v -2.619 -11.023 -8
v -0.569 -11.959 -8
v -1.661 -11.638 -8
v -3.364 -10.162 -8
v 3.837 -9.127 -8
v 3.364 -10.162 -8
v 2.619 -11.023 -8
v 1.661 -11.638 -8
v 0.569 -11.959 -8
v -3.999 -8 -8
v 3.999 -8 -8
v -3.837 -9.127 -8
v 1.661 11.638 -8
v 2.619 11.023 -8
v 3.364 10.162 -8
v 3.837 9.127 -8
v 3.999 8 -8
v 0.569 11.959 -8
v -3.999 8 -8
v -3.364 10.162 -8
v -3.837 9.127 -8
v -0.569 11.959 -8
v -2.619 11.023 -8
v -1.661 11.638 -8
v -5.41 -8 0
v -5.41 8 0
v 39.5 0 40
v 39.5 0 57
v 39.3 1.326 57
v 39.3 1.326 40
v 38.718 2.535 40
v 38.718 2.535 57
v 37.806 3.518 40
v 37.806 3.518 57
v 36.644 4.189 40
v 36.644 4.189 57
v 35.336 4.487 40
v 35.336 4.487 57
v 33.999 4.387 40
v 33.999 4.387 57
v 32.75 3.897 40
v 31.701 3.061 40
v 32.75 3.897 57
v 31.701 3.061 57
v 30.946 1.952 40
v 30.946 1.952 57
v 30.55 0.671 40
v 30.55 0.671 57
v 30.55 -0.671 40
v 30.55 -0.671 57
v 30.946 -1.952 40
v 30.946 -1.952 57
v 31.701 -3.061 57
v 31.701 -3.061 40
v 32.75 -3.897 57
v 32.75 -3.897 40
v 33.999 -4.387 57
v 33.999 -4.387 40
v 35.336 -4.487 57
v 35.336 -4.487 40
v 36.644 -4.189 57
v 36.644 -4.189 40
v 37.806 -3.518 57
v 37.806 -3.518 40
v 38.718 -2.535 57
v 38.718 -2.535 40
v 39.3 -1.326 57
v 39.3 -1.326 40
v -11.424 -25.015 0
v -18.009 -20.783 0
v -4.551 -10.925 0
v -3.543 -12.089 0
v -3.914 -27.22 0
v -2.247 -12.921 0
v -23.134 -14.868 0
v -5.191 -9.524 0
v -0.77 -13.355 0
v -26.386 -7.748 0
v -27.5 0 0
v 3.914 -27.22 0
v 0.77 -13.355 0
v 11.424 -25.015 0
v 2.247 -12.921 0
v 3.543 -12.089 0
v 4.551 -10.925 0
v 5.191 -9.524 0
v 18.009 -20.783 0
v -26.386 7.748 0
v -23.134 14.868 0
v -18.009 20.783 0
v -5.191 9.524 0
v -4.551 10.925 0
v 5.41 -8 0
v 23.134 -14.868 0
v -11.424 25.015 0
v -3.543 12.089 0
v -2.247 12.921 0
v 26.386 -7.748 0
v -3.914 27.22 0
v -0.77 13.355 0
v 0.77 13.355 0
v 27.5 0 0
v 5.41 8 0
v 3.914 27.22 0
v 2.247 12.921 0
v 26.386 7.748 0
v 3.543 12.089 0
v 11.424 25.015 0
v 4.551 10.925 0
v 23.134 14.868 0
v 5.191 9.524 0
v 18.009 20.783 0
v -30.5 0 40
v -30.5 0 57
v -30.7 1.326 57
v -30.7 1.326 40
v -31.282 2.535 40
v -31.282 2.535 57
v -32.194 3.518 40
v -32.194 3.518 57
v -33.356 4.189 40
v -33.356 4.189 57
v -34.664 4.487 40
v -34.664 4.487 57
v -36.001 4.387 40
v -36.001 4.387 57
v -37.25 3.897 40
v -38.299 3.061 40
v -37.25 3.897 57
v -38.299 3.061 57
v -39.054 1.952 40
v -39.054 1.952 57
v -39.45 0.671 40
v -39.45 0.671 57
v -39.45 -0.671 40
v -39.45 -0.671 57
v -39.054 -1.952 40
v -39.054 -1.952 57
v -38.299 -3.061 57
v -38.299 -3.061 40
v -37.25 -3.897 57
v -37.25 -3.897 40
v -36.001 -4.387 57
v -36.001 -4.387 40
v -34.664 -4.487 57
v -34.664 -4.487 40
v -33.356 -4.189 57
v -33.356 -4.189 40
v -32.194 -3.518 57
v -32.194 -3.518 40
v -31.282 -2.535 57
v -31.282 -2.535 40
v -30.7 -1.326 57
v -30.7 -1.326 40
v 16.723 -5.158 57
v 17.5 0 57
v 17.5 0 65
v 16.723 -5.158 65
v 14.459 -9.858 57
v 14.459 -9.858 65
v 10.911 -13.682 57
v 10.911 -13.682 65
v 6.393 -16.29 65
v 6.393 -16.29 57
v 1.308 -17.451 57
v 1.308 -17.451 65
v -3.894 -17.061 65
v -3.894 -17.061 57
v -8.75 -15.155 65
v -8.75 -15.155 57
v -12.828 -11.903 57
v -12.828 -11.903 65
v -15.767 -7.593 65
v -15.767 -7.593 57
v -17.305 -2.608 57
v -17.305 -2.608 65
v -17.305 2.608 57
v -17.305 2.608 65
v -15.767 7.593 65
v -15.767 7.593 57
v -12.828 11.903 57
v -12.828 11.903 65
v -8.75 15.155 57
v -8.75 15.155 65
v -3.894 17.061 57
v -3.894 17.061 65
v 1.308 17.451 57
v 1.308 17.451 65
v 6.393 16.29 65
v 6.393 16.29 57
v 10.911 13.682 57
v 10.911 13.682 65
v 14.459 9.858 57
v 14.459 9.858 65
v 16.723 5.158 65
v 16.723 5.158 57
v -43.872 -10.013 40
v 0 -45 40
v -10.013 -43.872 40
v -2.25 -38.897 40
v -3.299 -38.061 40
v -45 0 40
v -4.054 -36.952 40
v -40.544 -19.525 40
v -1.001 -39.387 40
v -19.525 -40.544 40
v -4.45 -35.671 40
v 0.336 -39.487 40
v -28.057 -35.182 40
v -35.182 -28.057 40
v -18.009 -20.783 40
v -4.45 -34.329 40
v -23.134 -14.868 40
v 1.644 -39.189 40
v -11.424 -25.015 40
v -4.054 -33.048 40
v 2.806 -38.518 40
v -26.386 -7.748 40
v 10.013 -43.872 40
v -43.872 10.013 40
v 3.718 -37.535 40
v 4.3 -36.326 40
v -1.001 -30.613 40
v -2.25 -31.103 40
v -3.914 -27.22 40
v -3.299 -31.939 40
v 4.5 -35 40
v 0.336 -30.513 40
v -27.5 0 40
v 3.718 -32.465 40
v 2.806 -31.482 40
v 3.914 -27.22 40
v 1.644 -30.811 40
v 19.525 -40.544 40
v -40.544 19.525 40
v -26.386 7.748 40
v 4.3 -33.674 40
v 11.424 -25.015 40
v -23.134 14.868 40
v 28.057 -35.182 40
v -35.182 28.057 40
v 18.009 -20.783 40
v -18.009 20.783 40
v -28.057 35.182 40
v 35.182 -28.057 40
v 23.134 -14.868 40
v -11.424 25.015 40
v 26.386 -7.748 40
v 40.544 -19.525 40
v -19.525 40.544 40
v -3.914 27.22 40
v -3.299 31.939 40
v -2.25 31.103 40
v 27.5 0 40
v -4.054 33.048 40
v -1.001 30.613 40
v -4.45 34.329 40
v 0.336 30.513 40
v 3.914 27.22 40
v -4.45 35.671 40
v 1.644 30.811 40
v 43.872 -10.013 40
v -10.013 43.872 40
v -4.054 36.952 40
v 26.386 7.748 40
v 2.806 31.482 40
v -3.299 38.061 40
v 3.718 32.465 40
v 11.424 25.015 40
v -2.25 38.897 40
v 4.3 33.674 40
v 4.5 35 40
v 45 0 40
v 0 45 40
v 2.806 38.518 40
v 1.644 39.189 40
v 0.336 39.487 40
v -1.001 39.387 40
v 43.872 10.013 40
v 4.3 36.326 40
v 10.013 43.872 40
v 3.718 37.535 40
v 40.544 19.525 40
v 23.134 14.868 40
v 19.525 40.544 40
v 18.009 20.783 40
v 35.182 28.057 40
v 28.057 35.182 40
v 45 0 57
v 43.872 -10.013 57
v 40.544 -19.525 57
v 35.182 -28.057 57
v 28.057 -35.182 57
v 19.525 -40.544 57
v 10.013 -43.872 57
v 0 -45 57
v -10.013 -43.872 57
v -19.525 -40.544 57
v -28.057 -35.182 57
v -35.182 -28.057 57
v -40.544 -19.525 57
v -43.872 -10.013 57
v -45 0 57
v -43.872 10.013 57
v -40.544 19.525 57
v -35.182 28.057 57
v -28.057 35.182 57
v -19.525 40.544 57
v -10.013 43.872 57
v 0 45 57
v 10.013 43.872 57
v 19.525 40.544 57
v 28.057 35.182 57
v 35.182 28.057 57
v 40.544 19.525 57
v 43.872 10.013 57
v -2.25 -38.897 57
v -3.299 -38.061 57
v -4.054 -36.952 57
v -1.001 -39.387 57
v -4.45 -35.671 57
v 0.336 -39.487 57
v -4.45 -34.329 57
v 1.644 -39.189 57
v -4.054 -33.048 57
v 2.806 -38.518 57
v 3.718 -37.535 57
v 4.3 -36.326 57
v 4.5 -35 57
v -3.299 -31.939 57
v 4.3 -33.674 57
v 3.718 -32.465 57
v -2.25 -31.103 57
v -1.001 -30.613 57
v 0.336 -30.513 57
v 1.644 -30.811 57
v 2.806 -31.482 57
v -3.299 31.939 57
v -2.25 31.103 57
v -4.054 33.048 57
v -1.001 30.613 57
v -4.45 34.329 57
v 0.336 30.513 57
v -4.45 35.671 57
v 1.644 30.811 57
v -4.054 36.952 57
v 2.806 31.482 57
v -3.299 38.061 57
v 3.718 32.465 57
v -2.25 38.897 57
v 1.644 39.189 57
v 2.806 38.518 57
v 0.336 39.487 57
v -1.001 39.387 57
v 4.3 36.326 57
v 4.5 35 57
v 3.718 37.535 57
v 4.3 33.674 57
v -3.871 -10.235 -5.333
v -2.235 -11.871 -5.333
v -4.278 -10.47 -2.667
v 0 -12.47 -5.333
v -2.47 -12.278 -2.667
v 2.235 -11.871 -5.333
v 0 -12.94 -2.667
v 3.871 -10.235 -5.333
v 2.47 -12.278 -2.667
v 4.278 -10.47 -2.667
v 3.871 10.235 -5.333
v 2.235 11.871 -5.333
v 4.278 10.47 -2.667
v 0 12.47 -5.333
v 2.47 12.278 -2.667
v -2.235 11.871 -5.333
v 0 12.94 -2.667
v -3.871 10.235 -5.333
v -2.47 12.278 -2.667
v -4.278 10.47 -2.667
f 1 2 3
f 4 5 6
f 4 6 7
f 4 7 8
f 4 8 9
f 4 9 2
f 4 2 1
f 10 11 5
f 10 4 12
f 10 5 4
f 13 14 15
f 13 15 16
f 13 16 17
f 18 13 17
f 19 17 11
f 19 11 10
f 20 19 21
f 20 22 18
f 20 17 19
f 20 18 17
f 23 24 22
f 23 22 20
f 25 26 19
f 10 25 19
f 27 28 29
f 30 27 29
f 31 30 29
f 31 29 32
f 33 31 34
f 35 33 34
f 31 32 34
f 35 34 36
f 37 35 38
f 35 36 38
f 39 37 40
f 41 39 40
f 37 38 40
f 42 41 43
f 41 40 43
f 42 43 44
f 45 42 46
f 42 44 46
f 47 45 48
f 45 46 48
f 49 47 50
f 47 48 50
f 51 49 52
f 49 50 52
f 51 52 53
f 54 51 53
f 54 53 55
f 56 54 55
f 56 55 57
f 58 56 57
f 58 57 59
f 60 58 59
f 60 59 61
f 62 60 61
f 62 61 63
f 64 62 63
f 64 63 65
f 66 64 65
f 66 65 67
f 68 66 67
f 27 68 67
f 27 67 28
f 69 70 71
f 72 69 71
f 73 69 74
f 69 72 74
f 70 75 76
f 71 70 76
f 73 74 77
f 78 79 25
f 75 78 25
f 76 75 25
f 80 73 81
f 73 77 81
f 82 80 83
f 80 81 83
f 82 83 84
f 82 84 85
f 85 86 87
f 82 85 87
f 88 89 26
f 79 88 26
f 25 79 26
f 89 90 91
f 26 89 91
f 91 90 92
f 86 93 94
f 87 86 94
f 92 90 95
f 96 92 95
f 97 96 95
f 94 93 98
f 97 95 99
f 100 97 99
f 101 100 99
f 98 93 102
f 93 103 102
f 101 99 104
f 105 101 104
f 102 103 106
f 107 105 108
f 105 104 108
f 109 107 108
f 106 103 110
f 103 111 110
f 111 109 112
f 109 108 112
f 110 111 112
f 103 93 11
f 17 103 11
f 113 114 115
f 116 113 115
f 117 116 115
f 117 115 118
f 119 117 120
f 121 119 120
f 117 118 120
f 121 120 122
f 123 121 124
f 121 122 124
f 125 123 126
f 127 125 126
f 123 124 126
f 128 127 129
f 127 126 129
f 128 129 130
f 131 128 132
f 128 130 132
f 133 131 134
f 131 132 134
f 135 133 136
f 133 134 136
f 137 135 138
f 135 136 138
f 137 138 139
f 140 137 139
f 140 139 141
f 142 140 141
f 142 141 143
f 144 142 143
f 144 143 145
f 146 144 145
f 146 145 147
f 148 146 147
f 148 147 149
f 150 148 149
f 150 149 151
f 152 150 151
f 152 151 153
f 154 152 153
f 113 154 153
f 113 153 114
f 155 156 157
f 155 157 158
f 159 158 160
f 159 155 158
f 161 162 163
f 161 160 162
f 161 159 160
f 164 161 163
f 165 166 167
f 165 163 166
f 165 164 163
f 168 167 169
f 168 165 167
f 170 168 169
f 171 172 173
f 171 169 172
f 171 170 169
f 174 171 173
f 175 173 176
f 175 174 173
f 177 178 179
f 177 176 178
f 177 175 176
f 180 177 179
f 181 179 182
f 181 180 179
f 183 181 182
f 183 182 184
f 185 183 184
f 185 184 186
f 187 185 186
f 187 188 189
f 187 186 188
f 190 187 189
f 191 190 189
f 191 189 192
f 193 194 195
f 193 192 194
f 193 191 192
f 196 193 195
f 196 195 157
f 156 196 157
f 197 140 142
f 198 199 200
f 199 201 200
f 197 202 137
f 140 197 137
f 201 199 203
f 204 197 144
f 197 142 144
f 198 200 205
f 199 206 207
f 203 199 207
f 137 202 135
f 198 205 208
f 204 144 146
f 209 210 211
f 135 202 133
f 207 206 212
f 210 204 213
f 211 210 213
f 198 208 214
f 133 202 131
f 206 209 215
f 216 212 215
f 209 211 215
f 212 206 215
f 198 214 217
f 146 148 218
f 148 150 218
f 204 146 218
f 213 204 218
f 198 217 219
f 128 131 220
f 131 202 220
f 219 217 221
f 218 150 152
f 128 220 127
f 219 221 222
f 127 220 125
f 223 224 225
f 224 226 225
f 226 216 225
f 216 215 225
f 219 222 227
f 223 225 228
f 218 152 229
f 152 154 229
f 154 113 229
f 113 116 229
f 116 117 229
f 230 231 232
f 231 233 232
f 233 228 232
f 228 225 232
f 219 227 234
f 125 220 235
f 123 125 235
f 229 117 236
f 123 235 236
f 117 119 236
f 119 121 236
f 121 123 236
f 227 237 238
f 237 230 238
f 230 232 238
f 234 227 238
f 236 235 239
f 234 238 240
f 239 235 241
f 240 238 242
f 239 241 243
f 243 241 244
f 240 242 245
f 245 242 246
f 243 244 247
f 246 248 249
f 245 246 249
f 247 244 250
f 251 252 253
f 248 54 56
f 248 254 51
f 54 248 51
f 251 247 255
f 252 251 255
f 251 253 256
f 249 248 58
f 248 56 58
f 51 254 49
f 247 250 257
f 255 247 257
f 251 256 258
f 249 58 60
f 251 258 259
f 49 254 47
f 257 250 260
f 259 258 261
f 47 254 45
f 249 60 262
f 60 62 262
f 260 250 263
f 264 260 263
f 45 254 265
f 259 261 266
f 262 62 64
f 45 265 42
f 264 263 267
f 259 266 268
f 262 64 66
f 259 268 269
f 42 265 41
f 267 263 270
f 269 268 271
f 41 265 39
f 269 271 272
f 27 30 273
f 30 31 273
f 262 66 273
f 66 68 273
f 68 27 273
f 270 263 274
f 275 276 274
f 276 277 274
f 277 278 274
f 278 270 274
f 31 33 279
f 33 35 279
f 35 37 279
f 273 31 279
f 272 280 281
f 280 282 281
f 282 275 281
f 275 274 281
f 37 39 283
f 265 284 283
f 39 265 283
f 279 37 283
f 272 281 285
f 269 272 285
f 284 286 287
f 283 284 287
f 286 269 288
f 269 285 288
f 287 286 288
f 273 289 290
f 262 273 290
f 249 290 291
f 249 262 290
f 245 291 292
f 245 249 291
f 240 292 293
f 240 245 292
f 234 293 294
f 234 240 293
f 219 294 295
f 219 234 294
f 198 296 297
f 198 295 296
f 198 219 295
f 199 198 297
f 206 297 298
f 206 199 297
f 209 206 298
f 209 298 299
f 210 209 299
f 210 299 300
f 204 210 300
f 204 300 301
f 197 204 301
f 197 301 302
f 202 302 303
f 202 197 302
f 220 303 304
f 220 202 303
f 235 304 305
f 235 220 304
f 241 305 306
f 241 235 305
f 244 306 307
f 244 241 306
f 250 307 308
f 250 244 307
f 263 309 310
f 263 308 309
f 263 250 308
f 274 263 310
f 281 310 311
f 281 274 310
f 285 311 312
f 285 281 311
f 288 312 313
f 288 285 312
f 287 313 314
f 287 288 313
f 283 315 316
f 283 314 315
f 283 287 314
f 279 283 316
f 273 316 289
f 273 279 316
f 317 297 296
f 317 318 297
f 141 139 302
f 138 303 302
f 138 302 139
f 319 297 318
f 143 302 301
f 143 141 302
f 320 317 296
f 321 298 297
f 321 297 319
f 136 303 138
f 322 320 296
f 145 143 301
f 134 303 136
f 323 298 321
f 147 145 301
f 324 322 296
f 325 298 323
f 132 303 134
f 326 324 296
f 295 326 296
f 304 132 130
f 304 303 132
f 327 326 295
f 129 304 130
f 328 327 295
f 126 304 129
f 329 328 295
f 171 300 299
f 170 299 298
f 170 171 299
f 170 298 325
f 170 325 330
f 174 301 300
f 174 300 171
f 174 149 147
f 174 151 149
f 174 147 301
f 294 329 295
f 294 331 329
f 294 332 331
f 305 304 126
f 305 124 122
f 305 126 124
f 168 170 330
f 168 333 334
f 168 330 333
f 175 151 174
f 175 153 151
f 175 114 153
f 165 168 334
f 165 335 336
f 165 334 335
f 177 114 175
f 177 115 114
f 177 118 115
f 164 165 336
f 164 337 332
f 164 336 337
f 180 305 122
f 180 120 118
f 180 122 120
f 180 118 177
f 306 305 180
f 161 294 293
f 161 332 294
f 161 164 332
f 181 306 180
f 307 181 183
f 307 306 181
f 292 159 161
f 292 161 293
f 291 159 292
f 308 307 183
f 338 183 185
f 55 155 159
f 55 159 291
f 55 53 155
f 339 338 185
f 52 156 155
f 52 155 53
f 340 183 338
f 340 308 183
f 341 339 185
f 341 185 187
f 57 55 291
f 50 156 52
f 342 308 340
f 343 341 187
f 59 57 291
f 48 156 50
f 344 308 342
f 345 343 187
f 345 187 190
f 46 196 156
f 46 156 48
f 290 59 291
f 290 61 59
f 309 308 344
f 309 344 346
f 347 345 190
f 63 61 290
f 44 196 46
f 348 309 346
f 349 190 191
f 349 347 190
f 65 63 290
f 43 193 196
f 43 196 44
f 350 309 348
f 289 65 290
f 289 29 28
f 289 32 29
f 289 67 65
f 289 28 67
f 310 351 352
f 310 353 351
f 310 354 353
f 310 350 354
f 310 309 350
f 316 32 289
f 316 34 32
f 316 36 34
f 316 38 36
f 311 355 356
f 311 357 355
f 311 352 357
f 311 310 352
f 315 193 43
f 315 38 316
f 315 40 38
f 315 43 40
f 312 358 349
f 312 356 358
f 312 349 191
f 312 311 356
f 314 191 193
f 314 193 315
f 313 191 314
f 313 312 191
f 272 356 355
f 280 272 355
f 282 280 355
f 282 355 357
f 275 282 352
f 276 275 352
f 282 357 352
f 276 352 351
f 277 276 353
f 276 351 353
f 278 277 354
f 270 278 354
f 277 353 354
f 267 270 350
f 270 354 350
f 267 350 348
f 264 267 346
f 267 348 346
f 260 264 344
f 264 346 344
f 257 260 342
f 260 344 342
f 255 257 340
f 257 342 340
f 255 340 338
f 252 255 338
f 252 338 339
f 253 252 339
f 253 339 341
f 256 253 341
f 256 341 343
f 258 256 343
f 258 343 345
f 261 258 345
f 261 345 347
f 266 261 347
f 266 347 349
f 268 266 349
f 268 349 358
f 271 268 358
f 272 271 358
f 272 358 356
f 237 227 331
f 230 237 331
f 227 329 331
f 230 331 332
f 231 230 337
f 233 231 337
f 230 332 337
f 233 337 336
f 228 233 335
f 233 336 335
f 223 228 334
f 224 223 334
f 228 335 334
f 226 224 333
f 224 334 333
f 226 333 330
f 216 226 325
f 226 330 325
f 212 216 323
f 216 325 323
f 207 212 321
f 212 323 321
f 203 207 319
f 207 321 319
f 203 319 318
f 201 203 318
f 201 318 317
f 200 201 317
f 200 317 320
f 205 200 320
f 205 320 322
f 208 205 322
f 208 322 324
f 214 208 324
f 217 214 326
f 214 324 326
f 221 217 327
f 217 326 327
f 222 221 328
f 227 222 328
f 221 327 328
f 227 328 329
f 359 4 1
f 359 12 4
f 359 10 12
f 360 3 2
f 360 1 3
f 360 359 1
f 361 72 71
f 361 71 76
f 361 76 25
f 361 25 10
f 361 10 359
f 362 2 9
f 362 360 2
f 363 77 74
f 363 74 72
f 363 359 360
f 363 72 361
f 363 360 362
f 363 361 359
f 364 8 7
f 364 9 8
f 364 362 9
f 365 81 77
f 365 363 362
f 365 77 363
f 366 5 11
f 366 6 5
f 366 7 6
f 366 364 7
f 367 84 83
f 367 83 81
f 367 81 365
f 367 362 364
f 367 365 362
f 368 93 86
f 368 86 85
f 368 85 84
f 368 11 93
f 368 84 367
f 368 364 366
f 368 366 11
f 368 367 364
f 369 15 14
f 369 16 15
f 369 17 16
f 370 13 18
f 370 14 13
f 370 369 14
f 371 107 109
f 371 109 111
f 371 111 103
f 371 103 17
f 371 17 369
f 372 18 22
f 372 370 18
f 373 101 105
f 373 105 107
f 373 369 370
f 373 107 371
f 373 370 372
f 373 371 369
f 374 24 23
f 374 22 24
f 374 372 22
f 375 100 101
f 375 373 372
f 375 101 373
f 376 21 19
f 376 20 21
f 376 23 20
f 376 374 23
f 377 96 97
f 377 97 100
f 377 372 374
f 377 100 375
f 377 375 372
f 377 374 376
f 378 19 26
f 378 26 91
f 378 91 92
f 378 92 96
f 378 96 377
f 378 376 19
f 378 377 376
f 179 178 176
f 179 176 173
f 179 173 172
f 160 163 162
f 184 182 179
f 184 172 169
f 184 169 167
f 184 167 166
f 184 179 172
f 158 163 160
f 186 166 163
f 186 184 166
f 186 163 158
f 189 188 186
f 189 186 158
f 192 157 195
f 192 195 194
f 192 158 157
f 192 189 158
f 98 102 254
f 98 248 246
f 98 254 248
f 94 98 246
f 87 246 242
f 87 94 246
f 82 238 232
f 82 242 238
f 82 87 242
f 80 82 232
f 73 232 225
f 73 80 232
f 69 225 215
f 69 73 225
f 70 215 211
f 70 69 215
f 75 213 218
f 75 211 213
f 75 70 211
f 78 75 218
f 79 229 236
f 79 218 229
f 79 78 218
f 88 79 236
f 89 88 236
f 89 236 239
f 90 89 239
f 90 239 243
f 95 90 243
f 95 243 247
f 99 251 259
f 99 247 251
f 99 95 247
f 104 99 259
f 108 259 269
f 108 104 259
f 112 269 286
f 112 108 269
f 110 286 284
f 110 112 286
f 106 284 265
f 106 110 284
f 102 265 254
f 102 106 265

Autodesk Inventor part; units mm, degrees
ref_plane "YZ Plane" through (0, 0, 0) normal (1, 0, 0) x (0, 1, 0)
ref_plane "XZ Plane" through (0, 0, 0) normal (0, 1, 0) x (-1, 0, 0)
ref_plane "XY Plane" through (0, 0, 0) normal (0, 0, 1) x (1, 0, 0)
sketch "Esboço1" plane through (0, 0, 0) normal (0, 0, 1) x (1, 0, 0)
  circle A0 centre (0, 0) radius 27.5
  dimension "d0" = 55
extrude "Extrusão1" add sketch "Esboço1" along normal blind 40
sketch "Esboço2" plane through (0, 0, 40) normal (0, 0, 1) x (1, 0, 0)
  circle A0 centre (0, 0) radius 45
  dimension "d3" = 90
extrude "Extrusão2" add sketch "Esboço2" along normal blind 17
sketch "Esboço3" plane through (0, 0, 57) normal (0, 0, 1) x (1, 0, 0)
  circle A0 centre (35, 0) radius 4.5
  circle A1 centre (0, 35) radius 4.5
  circle A2 centre (-35, 0) radius 4.5
  circle A3 centre (0, -35) radius 4.5
  point P0 (0, 0)
  dimension "d7" = 9
  dimension "d8" = 35
  dimension "d11" = 360
extrude "Extrusão3" cut sketch "Esboço3" against normal blind 17.5
sketch "Esboço4" plane through (0, 0, 57) normal (0, 0, 1) x (1, 0, 0)
  circle A0 centre (0, 0) radius 27.5 projected
  circle A1 centre (0, 0) radius 17.5
  dimension "d15" = 35
extrude "Extrusão4" add sketch "Esboço4" along normal blind 8 contours A1
sketch "Esboço6" plane through (0, 0, 0) normal (0, 0, -1) x (-1, 0, 0)
  line L0 (0, 8) -> (0, -8) construction
  line L1 (5.41, 8) -> (5.41, -8)
  line L2 (-5.41, -8) -> (-5.41, 8)
  arc A0 (5.41, 8) -> (-5.41, 8) centre (0, 8) ccw
  arc A1 (-5.41, -8) -> (5.41, -8) centre (0, -8) ccw
  point P0 (0, 0)
  point P1 (0, 0)
  dimension "d24" = 5.41
  dimension "d25" = 16
  dimension "d26" = 0
  dimension "d27" = 0
extrude "Extrusão5" add sketch "Esboço6" along normal blind 8 draft -10
properties part number "Matriz superior do Ferramental"
